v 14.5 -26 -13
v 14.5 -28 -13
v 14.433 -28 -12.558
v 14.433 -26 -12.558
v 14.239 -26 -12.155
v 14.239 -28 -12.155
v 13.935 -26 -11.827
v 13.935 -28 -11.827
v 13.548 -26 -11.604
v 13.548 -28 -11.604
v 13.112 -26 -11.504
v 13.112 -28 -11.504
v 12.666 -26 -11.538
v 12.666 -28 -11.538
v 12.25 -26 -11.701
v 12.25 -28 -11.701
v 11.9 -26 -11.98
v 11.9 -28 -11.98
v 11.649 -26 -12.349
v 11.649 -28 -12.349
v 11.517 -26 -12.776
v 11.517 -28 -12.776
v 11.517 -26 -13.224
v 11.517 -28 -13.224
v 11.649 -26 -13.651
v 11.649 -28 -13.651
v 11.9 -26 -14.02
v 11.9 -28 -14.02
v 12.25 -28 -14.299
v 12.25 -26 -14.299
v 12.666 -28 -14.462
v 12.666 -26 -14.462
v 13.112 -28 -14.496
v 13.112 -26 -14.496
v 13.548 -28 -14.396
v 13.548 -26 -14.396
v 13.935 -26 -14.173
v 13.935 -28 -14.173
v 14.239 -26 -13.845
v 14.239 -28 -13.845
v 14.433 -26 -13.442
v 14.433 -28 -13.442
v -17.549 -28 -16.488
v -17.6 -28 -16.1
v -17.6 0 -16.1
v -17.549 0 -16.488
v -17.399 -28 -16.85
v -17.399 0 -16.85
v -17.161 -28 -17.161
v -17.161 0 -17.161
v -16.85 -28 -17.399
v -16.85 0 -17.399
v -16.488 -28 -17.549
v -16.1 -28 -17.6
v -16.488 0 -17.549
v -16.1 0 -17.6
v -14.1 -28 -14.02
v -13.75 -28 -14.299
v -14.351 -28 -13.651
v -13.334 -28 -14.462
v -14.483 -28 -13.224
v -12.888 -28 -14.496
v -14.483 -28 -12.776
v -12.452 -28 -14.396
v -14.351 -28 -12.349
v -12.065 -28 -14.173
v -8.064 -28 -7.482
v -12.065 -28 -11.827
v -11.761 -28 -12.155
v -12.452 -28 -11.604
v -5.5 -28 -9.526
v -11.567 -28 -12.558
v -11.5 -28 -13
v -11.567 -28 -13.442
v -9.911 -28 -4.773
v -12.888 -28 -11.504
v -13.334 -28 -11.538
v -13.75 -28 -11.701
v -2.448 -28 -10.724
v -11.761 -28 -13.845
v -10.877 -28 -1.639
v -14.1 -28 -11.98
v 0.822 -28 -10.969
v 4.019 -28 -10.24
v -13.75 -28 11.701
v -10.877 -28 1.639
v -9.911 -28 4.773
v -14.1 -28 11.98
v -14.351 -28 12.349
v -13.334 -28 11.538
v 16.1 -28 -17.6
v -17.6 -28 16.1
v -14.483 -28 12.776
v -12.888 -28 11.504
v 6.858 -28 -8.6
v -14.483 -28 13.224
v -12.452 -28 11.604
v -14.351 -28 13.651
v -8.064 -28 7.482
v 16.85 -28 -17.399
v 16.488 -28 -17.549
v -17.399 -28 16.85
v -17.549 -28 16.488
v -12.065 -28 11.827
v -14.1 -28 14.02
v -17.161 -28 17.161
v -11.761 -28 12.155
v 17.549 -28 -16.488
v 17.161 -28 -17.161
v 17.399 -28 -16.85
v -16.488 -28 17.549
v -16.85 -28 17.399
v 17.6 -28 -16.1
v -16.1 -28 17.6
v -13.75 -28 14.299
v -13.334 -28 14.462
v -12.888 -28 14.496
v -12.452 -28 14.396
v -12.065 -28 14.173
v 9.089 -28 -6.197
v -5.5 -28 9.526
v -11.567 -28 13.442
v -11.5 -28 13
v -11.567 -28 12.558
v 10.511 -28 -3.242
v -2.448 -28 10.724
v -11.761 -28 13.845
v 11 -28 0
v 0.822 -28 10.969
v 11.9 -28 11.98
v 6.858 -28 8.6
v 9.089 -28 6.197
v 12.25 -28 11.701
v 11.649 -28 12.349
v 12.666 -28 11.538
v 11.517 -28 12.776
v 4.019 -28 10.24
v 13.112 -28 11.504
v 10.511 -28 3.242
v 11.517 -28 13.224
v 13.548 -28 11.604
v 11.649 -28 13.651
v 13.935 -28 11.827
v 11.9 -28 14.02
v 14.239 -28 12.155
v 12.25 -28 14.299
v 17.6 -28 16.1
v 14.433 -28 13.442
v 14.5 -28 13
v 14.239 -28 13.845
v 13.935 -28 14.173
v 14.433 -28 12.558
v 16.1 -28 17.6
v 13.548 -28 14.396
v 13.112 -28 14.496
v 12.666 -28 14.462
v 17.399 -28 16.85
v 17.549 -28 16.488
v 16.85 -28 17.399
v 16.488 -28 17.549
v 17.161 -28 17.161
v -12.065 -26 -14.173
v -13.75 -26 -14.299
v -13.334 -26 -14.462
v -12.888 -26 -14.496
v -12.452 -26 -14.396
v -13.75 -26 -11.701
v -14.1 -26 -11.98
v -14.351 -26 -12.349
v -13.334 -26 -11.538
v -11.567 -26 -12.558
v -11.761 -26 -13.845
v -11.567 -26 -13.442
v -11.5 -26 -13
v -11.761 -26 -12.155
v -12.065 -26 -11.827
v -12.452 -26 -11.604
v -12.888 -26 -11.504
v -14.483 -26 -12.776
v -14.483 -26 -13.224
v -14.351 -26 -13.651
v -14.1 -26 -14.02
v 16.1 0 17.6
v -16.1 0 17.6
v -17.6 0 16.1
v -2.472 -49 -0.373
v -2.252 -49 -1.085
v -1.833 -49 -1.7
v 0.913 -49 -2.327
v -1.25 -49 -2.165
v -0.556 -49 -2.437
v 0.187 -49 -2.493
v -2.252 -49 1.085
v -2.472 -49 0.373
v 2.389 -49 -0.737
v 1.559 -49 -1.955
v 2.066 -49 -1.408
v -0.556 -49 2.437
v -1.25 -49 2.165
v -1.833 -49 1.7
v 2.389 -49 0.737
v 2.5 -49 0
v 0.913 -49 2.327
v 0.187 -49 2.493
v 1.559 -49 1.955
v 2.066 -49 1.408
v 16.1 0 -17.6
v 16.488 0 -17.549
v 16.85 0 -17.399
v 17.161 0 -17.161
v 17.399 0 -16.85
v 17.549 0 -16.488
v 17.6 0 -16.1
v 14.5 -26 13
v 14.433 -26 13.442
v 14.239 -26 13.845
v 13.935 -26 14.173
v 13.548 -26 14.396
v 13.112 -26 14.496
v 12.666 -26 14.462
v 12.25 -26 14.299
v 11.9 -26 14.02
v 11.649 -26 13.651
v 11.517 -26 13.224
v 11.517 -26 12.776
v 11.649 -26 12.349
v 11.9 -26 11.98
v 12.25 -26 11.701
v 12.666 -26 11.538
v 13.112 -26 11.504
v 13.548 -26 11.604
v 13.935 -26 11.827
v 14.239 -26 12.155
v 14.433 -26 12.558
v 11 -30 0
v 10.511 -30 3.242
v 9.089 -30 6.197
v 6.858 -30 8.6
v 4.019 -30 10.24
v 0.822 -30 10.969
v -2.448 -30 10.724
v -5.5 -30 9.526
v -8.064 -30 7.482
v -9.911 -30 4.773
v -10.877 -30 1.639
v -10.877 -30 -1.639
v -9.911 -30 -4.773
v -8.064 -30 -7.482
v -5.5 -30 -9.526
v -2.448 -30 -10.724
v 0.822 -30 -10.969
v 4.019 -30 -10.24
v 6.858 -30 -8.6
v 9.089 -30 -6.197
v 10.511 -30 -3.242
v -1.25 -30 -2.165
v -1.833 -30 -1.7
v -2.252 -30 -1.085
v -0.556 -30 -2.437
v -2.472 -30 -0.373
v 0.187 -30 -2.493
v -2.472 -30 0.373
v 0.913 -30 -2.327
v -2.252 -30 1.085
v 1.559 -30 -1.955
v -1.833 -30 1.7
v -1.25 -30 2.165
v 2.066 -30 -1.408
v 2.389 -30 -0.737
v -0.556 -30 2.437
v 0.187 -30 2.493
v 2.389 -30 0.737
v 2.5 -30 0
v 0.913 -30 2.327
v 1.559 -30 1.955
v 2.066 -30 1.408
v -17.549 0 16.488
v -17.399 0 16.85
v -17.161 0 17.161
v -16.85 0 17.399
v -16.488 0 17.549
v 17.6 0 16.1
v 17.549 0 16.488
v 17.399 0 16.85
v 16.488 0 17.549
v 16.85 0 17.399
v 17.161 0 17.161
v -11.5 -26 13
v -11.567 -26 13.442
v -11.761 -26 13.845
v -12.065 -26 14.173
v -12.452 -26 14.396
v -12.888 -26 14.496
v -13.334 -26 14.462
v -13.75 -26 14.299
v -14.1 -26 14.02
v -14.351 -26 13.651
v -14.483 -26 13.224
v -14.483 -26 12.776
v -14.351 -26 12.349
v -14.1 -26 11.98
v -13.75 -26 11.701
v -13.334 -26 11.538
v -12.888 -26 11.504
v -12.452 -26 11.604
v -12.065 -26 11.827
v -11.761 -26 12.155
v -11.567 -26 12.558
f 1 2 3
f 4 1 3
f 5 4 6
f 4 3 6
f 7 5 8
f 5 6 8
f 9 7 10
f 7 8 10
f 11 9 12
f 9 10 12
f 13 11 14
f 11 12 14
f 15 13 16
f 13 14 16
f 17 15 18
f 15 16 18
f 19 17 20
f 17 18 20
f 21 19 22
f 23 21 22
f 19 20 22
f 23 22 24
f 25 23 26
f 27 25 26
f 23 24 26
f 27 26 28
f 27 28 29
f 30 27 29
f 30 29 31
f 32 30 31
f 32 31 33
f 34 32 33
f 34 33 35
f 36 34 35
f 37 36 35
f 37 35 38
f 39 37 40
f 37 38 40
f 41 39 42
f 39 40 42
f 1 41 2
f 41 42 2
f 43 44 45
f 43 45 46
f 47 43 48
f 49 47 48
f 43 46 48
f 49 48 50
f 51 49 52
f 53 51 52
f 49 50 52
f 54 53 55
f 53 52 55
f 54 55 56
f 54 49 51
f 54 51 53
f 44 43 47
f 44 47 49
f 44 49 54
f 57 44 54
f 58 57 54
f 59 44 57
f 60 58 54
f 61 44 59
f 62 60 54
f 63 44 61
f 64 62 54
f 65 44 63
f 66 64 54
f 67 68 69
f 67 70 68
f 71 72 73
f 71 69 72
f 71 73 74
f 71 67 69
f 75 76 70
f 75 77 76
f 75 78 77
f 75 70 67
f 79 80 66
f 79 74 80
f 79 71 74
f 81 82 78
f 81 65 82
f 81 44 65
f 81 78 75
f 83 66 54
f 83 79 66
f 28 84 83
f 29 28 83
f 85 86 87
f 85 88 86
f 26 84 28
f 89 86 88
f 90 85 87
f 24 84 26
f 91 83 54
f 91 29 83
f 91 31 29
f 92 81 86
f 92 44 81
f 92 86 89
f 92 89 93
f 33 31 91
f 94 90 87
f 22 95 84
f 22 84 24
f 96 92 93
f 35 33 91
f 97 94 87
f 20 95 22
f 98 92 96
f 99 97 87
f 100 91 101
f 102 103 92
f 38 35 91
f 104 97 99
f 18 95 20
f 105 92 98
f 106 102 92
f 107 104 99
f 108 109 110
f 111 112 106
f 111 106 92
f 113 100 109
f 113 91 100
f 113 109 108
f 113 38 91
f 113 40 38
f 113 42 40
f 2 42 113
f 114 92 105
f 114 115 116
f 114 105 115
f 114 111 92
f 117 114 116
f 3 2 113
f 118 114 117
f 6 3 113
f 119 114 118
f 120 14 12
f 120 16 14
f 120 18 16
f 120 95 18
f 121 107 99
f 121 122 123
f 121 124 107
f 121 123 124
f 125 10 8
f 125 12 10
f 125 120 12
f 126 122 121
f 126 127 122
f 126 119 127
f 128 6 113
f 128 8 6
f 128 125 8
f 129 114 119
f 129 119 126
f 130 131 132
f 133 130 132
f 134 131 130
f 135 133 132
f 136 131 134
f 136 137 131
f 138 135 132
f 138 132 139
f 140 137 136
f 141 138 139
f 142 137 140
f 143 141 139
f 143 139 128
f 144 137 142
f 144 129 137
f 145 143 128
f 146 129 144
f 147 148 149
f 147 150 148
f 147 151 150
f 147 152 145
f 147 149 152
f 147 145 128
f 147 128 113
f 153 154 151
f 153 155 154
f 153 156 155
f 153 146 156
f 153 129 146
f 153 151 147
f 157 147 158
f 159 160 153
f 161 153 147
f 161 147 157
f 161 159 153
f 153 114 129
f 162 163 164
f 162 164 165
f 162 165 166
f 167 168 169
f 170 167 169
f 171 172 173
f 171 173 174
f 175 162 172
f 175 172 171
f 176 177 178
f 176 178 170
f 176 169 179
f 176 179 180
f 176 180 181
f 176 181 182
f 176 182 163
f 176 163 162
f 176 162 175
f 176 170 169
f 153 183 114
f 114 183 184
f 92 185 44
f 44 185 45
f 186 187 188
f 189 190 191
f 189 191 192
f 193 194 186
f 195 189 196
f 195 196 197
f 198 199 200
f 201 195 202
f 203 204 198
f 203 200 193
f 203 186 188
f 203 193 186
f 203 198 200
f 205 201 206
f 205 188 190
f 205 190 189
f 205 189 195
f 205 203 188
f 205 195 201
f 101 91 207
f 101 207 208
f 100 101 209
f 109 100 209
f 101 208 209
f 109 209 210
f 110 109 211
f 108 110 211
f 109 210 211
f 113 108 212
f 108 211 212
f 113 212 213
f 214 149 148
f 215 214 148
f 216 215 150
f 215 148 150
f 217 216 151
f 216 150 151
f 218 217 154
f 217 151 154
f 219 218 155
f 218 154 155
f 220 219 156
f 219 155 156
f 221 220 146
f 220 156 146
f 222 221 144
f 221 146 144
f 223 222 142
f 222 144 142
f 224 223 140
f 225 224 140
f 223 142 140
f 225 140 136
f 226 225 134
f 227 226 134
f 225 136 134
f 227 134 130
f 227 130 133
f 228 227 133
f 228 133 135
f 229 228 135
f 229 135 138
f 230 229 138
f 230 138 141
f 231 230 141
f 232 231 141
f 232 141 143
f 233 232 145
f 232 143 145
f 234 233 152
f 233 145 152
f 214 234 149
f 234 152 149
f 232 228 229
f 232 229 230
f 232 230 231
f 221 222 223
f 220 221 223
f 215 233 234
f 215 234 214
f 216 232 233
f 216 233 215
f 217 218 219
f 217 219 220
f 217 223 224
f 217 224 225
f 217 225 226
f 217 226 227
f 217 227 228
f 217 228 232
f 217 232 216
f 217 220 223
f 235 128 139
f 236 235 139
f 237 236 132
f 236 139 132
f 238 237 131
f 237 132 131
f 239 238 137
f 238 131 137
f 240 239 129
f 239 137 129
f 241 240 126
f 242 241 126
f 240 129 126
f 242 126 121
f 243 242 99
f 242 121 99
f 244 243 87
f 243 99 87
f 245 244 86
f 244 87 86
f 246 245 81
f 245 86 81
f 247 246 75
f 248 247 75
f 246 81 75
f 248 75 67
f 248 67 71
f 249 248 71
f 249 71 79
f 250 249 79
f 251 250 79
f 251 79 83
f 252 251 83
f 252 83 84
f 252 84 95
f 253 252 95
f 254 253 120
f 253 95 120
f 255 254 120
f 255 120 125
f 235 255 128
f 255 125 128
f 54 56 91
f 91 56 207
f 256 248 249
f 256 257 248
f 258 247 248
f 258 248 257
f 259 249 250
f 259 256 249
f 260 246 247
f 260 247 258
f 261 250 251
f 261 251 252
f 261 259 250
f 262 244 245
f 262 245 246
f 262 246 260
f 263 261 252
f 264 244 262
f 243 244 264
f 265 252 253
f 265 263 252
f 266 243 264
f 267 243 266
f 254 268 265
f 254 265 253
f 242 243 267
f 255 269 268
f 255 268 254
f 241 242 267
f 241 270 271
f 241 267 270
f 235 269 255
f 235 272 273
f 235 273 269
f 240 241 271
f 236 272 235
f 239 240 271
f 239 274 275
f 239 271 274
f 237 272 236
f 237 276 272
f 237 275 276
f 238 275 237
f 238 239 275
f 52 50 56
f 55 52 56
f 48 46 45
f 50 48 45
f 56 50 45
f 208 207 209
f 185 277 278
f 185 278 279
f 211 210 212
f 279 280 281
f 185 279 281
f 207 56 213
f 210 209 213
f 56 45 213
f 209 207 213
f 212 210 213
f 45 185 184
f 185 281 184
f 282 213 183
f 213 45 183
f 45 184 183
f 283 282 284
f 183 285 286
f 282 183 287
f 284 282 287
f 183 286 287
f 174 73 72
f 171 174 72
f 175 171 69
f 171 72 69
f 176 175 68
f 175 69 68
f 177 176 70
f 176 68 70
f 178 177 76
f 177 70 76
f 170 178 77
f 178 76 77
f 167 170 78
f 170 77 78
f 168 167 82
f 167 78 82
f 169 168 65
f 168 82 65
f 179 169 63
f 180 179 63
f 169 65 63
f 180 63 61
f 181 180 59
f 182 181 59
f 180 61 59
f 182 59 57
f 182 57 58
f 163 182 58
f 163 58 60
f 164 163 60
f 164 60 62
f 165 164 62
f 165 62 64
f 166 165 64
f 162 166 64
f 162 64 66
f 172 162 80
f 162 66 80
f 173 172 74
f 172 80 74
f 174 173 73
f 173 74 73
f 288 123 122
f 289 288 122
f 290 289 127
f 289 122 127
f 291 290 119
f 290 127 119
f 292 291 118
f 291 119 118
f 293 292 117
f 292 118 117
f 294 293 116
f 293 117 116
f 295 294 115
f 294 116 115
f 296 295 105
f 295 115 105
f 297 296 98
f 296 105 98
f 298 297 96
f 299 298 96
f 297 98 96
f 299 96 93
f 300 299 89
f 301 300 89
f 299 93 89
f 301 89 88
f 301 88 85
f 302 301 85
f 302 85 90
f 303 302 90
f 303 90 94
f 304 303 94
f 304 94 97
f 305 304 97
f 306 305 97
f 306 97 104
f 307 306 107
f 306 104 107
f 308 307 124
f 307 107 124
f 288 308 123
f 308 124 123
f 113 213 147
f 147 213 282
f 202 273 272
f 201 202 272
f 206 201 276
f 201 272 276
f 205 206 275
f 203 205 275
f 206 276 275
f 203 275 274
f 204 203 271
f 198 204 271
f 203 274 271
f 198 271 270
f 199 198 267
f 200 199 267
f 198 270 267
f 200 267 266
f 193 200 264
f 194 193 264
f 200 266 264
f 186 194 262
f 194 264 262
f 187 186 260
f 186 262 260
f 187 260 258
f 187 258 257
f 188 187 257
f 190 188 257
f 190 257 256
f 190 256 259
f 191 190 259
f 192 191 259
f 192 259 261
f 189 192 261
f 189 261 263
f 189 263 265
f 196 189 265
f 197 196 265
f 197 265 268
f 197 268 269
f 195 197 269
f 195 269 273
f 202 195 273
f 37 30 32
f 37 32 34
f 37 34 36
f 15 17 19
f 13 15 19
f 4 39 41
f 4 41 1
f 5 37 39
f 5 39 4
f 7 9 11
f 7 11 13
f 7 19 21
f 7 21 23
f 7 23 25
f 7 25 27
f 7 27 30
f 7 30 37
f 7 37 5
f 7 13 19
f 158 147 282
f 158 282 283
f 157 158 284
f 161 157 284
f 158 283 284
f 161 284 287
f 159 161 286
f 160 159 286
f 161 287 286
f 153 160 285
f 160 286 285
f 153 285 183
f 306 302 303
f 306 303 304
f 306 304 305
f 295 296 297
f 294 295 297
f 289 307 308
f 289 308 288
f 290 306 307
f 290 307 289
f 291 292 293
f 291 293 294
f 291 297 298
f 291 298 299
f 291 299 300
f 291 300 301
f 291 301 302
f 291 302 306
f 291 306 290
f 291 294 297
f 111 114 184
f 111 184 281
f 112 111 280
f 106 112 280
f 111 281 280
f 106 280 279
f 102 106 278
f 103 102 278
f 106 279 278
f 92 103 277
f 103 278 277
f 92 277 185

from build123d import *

# Parameters (mm, degrees)
F1_DEPTH = 28
F2_R     = 11
F2_R_2   = 2.5
F3_DEPTH = 2
F2_R_3   = 1.5
F4_DEPTH = 2
F5_DEPTH = 21


with BuildPart() as f1:
    # F0 (on Front) → F1 (new body)
    with BuildSketch(Plane.XZ):
        with BuildLine():
            Line((-16.1, -17.6), (16.1, -17.6))
            ThreePointArc((16.1, -17.6), (17.16066, -17.16066), (17.6, -16.1))
            Line((17.6, -16.1), (17.6, 16.1))
            ThreePointArc((17.6, 16.1), (17.16066, 17.16066), (16.1, 17.6))
            Line((16.1, 17.6), (-16.1, 17.6))
            ThreePointArc((-16.1, 17.6), (-17.16066, 17.16066), (-17.6, 16.1))
            Line((-17.6, 16.1), (-17.6, -16.1))
            ThreePointArc((-17.6, -16.1), (-17.16066, -17.16066), (-16.1, -17.6))
        make_face()
    extrude(amount=F1_DEPTH)

    # F2 (on face) → F3 (join)
    with BuildSketch(Plane.XZ.offset(28)):
        Circle(F2_R)
        Circle(F2_R_2, mode=Mode.SUBTRACT)
    extrude(amount=F3_DEPTH)

    # F2 (on face) → F4 (cut)
    with BuildSketch(Plane.XZ.offset(28)):
        with Locations((-13, 13)):
            Circle(F2_R_3)
        with Locations((13, 13)):
            Circle(F2_R_3)
        with Locations((13, -13)):
            Circle(F2_R_3)
        with Locations((-13, -13)):
            Circle(F2_R_3)
    extrude(amount=-F4_DEPTH, mode=Mode.SUBTRACT)

    # F2 (on face) → F5 (join)
    with BuildSketch(Plane.XZ.offset(28)):
        Circle(F2_R_2)
    extrude(amount=F5_DEPTH)


solid = f1.part
